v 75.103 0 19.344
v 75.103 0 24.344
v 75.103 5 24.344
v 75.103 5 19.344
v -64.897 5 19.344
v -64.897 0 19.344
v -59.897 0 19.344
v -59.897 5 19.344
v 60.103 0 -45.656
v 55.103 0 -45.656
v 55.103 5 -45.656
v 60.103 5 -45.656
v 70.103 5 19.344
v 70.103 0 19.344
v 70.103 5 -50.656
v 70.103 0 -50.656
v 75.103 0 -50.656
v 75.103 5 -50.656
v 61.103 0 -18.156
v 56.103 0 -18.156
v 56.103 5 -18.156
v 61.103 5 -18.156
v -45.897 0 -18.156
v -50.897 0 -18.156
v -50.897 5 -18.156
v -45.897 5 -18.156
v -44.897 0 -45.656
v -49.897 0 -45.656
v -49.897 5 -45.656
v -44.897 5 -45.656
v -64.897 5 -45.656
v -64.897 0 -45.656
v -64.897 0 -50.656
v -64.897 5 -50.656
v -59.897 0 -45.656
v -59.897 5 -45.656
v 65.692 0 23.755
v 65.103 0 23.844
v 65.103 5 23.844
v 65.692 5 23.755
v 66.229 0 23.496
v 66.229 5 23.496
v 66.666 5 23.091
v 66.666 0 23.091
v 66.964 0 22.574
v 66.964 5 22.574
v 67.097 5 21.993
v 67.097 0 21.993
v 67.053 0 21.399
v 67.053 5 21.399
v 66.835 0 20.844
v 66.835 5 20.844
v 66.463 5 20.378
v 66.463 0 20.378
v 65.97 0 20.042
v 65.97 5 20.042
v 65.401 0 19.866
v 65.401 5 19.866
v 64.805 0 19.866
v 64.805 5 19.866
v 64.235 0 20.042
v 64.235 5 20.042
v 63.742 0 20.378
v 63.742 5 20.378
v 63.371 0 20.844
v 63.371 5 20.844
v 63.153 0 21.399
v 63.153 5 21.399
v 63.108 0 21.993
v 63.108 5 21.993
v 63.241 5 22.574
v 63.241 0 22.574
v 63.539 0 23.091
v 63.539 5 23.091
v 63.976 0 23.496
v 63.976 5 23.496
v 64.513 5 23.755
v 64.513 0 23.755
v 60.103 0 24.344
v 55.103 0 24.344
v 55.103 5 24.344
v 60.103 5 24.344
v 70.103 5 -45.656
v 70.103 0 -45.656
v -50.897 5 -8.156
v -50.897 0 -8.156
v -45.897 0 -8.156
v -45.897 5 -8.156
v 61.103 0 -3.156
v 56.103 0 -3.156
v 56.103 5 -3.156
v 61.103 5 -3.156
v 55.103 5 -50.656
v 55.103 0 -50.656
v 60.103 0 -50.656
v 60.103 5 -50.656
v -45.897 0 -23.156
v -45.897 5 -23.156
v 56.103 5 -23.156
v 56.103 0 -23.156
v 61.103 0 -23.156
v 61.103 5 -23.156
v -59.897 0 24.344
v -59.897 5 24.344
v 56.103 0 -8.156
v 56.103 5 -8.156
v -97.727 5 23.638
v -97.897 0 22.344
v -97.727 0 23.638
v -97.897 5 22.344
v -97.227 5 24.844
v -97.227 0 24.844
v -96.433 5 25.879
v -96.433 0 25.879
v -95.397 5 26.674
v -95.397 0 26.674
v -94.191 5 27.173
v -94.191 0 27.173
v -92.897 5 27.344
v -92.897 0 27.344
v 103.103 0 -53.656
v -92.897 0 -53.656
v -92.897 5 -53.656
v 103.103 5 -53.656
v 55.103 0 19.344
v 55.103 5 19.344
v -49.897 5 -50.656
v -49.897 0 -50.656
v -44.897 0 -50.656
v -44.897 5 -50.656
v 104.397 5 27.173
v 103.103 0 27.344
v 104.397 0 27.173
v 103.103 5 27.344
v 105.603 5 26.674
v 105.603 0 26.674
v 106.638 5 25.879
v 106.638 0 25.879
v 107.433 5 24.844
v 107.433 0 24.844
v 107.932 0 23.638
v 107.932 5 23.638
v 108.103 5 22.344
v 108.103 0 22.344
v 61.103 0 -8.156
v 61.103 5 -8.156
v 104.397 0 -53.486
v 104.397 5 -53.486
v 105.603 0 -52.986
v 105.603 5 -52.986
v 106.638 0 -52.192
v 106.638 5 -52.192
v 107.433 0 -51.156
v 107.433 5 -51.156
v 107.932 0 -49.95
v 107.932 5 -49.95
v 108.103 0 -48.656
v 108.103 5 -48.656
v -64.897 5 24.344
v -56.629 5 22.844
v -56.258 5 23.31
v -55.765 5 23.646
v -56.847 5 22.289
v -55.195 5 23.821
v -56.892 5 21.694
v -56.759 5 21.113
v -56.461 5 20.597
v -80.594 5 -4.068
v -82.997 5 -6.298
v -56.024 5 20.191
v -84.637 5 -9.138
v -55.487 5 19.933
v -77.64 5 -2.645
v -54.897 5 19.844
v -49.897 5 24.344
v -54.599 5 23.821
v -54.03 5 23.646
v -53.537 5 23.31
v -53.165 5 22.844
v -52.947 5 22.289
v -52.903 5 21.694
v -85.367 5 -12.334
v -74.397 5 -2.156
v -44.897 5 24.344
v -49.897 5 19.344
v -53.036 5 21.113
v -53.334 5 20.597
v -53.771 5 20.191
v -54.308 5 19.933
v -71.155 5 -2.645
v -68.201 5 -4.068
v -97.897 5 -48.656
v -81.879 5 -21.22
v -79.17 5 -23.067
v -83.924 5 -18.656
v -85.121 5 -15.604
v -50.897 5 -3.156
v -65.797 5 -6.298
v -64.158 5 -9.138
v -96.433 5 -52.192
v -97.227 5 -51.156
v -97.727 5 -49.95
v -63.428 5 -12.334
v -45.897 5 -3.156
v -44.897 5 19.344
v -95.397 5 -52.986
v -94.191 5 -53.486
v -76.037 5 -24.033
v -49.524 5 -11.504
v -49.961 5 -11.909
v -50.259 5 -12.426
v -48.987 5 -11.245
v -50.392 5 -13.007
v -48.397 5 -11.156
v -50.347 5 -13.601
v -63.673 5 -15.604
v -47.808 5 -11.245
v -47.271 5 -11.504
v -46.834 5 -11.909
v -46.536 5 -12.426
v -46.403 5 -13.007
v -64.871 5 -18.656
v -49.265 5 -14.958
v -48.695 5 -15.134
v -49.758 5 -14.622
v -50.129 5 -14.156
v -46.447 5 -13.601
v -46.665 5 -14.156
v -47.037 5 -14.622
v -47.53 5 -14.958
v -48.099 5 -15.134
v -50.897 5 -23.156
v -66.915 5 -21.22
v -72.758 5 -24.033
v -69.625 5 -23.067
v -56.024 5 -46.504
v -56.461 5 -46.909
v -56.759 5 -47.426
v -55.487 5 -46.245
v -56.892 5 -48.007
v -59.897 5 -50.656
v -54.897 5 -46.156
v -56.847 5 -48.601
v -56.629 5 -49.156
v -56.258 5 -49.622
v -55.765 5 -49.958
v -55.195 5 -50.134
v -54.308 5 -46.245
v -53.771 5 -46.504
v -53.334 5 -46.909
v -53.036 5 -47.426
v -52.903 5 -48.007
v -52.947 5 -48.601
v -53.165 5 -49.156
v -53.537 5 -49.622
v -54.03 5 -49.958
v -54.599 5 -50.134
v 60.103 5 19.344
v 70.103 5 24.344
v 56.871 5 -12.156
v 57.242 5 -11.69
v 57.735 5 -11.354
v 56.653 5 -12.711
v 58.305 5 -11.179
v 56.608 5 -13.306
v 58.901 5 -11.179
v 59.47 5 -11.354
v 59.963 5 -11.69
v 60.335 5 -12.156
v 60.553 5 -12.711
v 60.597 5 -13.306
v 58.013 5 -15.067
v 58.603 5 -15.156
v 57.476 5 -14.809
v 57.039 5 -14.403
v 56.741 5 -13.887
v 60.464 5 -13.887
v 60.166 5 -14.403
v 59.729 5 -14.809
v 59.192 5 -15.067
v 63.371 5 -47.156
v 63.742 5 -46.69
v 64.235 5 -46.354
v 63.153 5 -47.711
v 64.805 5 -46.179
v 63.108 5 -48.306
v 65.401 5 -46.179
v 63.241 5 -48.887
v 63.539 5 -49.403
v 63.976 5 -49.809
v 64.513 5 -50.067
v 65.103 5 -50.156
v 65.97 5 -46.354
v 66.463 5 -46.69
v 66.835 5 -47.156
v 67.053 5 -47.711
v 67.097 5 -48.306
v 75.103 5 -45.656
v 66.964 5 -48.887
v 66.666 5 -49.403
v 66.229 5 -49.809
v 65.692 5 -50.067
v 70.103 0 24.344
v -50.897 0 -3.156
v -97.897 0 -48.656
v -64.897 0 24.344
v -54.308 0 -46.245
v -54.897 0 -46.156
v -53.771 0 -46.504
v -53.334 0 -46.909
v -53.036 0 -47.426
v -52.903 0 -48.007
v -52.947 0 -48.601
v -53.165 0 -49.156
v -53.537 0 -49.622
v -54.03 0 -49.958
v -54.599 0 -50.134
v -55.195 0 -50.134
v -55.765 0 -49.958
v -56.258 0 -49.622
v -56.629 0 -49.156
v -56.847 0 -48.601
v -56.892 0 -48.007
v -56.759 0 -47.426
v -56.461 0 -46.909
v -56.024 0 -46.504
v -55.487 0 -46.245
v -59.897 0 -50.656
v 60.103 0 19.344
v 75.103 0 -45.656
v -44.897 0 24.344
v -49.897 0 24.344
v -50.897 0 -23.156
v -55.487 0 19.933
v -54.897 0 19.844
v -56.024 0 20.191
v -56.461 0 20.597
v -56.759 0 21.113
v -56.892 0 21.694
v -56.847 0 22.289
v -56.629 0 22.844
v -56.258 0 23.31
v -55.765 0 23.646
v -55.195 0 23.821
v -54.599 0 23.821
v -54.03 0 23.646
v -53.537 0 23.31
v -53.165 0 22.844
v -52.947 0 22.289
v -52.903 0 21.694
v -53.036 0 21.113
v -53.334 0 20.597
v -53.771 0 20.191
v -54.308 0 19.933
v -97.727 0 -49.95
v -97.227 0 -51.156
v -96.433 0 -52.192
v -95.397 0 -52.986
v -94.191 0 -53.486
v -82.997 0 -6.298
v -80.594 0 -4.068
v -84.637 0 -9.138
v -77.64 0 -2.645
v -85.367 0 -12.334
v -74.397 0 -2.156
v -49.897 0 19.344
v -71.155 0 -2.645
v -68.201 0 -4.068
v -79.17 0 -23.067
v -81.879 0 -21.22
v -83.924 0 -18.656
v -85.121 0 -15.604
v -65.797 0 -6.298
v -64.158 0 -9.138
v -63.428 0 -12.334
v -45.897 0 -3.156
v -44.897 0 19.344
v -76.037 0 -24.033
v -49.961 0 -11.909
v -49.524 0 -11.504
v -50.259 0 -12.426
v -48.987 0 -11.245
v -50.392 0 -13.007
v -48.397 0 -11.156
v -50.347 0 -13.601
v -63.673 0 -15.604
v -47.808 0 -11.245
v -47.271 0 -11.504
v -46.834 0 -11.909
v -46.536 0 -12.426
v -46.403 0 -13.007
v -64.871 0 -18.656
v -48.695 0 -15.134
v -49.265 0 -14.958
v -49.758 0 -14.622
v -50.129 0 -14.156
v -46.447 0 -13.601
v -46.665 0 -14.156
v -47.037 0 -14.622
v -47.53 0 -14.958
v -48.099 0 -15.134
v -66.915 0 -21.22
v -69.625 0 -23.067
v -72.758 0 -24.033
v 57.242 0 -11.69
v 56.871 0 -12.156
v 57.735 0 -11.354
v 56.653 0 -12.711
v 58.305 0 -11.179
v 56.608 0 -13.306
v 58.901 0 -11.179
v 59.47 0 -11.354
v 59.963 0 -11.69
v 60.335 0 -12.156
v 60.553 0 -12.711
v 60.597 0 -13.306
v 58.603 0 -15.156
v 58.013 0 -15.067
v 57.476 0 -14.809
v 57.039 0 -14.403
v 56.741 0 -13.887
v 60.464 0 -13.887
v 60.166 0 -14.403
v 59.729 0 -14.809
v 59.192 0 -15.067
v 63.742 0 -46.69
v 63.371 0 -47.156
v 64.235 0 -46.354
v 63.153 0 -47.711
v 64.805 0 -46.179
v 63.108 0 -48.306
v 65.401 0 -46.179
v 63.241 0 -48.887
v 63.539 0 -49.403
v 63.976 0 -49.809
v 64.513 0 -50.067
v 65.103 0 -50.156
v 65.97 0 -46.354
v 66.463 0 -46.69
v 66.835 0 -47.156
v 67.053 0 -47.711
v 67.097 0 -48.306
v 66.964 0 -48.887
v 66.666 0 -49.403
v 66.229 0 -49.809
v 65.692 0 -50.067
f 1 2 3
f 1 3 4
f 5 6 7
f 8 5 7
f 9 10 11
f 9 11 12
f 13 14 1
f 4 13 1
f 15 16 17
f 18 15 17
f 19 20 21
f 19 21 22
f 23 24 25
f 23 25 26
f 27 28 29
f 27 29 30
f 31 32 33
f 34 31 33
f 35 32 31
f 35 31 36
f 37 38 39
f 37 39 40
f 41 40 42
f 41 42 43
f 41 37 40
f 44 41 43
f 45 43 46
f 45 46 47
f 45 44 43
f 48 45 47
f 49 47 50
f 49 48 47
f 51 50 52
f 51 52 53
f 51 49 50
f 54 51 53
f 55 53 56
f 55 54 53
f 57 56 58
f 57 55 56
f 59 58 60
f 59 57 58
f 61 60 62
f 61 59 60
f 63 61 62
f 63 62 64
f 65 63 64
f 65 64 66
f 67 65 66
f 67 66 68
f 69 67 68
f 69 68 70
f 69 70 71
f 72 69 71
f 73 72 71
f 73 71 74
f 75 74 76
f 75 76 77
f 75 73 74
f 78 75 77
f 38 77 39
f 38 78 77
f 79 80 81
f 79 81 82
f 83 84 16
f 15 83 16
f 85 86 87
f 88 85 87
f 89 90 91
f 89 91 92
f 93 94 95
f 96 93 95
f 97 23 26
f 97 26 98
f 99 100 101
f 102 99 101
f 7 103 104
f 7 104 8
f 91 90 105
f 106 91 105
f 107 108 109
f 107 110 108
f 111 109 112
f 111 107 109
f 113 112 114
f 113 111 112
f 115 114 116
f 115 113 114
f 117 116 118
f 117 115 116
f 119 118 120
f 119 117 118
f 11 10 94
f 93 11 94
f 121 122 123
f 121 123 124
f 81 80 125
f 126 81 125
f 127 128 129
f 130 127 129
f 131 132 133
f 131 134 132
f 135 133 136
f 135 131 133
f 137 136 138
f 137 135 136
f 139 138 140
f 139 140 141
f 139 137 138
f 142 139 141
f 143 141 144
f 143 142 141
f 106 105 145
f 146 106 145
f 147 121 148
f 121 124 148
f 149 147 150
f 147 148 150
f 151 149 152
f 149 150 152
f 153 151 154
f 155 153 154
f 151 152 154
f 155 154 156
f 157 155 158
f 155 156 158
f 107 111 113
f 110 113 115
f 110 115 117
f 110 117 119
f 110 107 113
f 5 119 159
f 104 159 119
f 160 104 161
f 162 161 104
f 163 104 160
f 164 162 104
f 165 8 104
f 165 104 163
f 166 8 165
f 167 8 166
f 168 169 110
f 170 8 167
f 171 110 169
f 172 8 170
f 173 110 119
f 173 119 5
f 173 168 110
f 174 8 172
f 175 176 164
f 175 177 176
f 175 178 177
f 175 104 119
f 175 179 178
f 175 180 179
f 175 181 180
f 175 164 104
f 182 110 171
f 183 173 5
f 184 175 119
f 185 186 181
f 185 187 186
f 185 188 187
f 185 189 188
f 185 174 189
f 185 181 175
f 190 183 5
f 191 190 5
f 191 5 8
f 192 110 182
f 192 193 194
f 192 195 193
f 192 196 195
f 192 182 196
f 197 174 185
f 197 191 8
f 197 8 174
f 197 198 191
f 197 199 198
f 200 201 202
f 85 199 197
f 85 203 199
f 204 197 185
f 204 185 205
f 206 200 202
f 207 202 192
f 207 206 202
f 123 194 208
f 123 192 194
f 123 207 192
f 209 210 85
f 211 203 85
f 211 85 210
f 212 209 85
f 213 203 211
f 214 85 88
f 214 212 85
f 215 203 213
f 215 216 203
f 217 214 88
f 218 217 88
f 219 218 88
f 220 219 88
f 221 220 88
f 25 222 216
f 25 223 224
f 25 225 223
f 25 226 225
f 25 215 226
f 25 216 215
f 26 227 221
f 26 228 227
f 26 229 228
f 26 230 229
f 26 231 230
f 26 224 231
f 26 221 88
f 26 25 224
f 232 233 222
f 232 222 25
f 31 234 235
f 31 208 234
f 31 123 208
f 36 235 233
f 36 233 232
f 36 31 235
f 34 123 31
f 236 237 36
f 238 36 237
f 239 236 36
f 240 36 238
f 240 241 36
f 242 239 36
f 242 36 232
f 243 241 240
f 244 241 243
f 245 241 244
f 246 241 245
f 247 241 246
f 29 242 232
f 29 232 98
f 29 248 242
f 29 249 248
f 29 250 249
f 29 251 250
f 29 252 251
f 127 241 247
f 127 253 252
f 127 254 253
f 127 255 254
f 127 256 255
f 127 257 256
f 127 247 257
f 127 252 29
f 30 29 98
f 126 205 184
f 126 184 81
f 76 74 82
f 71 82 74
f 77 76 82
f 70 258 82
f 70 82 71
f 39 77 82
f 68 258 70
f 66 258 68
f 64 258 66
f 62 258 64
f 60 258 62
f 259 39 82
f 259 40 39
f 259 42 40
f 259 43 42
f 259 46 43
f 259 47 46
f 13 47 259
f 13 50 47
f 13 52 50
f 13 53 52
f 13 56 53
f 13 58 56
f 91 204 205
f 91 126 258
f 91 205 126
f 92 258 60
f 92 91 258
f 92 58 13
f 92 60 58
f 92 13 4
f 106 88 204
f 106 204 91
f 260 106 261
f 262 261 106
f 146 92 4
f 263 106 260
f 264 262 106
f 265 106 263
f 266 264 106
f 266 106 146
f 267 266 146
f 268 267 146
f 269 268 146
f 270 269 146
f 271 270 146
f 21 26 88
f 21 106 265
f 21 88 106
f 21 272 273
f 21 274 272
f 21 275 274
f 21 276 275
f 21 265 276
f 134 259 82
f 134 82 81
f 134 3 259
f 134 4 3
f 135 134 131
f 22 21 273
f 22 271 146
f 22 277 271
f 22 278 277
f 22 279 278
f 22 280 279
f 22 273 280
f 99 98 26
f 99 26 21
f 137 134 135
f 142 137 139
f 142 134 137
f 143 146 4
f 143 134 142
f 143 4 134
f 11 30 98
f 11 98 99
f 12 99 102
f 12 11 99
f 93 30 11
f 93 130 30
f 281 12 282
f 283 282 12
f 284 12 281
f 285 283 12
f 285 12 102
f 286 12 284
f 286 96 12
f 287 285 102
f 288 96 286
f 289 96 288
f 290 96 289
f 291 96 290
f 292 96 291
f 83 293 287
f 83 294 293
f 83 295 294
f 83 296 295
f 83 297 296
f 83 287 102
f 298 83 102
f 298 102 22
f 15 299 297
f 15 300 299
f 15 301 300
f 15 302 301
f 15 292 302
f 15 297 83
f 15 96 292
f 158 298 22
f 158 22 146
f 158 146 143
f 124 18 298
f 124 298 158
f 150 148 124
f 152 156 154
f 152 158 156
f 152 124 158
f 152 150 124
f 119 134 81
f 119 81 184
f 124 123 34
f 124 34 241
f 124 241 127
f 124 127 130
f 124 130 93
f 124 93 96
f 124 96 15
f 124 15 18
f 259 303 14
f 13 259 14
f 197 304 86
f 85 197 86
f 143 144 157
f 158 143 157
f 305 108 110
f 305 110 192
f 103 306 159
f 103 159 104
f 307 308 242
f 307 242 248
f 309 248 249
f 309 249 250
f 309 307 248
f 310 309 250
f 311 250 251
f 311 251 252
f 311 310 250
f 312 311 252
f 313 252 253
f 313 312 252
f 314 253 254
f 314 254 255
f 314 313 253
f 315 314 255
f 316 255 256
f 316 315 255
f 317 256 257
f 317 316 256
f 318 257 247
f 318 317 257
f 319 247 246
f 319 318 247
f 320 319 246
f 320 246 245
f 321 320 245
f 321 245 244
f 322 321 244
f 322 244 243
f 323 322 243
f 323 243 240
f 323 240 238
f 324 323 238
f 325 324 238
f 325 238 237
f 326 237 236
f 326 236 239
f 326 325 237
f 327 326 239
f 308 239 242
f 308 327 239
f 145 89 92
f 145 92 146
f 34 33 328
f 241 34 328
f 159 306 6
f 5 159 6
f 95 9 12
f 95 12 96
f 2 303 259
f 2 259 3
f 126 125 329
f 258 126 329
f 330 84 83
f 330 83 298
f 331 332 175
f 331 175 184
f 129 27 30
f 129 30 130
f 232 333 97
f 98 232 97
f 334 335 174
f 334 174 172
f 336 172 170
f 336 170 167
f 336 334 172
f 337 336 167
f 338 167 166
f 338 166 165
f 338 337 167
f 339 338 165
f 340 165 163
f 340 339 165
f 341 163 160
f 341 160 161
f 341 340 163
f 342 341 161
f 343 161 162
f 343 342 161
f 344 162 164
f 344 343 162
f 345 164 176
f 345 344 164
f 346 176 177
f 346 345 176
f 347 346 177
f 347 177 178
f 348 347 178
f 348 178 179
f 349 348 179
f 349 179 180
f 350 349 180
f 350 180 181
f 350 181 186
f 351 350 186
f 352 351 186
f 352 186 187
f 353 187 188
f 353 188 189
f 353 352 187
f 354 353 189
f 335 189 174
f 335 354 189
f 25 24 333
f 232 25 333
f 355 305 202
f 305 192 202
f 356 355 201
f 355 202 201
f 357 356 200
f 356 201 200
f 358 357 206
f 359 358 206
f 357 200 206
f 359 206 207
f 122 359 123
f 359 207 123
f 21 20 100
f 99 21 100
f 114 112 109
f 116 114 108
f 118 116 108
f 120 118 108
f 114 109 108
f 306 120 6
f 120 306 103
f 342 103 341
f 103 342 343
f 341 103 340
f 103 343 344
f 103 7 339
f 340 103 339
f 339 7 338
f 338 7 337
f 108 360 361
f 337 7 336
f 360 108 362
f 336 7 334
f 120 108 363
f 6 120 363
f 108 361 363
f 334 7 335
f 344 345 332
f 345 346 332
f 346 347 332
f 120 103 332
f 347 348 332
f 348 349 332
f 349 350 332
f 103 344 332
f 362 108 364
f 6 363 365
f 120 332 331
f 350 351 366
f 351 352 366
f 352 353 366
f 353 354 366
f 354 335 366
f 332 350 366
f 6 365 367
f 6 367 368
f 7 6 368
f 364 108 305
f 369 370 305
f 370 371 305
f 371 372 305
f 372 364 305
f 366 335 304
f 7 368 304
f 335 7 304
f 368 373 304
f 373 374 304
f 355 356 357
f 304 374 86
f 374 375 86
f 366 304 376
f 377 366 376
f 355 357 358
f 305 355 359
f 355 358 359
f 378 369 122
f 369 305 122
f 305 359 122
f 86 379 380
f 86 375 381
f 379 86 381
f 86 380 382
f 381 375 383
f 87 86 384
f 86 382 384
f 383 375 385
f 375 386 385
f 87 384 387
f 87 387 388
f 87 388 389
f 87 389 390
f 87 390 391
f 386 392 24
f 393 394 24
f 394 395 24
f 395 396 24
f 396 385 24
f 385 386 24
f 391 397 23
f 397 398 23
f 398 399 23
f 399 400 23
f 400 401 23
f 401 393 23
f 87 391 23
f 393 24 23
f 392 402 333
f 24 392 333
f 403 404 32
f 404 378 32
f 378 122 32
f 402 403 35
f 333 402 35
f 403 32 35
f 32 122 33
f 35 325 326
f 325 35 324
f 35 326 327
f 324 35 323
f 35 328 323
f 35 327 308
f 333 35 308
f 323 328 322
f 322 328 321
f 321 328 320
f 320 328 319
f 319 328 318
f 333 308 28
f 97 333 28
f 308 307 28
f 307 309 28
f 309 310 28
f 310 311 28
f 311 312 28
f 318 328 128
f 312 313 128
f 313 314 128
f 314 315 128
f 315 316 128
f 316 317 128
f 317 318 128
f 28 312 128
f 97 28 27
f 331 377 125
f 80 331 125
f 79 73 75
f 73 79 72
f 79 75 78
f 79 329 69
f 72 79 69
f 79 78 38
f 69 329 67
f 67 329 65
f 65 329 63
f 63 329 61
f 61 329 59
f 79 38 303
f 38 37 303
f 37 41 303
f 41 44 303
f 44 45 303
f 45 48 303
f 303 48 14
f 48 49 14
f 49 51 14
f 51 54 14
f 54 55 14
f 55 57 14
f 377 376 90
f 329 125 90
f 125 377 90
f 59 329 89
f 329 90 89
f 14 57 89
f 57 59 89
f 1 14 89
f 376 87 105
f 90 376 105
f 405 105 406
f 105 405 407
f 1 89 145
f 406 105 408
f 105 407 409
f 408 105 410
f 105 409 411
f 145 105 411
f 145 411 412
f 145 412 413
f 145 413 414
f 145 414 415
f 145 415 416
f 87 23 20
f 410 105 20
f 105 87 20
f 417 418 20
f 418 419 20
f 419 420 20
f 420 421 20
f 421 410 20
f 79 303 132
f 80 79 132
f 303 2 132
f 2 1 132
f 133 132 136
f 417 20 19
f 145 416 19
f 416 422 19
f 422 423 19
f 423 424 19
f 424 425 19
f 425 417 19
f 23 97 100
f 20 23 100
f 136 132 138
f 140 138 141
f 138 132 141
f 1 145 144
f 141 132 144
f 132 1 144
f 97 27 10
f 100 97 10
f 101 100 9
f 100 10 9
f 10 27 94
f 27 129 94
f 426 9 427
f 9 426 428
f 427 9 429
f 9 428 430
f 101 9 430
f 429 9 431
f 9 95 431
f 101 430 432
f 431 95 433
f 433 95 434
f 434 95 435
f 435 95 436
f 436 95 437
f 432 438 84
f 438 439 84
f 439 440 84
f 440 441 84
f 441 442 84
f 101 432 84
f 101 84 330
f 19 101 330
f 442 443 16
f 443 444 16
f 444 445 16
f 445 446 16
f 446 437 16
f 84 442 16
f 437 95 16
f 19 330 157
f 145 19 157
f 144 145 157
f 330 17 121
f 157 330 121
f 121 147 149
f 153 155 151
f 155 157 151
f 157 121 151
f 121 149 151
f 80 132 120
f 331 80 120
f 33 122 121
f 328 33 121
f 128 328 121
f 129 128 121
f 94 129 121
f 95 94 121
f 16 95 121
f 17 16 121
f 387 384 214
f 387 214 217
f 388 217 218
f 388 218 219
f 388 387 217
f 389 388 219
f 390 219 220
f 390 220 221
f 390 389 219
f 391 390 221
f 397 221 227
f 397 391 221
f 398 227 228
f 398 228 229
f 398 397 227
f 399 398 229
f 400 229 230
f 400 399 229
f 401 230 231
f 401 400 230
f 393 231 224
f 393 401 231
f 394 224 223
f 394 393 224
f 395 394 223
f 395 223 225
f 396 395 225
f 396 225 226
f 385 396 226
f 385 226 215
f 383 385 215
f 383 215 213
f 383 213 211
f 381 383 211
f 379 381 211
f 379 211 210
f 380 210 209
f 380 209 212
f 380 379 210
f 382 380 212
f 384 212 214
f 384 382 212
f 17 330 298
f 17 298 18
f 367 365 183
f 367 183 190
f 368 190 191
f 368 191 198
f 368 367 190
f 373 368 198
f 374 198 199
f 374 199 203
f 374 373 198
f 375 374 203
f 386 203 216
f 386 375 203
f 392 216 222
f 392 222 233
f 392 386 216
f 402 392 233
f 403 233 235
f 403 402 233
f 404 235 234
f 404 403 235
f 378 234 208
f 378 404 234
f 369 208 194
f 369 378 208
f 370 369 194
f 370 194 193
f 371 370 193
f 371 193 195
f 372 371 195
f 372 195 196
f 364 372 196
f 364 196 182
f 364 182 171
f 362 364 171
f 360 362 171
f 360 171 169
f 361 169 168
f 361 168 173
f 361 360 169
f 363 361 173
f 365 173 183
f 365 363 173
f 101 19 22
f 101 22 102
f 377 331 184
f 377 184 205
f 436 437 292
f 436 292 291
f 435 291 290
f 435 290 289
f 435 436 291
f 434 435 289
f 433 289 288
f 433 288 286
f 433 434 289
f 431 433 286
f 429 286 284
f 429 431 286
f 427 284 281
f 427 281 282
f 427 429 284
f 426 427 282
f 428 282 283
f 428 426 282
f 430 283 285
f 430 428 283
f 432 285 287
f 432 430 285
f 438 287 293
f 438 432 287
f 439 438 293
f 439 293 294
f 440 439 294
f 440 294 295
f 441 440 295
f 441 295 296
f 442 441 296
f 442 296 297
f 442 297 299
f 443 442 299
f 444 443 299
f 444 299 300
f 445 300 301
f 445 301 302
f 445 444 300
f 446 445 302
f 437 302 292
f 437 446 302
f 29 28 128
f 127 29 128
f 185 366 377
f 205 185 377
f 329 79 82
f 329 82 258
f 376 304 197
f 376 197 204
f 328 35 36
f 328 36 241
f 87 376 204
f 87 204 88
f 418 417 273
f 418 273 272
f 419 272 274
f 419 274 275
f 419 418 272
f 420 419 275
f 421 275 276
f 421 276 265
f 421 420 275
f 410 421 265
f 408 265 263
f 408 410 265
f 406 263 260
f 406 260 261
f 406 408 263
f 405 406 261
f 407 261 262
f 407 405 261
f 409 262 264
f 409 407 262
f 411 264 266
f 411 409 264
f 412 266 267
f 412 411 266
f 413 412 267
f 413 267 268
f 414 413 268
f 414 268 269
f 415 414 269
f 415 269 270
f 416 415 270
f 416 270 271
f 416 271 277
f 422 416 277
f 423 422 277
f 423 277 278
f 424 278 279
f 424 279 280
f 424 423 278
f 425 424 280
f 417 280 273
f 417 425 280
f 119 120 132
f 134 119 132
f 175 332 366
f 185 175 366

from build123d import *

# Parameters (mm, degrees)
SKETCH1_W           = 206
SKETCH1_H           = 81
SKETCH1_R           = 2
SKETCH1_R_2         = 11
SKETCH1_W_2         = 5
SKETCH1_H_2         = 5
BOSS_EXTRUDE4_DEPTH = 5
FILLET9_R           = 5


with BuildPart() as part:
    # Sketch1 → Boss-Extrude4 (new body)
    with BuildSketch(Plane(origin=(0, 0, 0), x_dir=(1, 0, 0), z_dir=(0, 1, 0))):
        with Locations((5.102707087, 13.156325227)):
            Rectangle(SKETCH1_W, SKETCH1_H)
        with Locations(Location((-54.897292913, 48.156325227, 0), (0, 0, 270))):
            Circle(SKETCH1_R, mode=Mode.SUBTRACT)
        with Locations(Location((-54.897292913, -21.843674773, 0), (0, 0, 90))):
            Circle(SKETCH1_R, mode=Mode.SUBTRACT)
        with Locations(Location((65.102707087, -21.843674773, 0), (0, 0, 270))):
            Circle(SKETCH1_R, mode=Mode.SUBTRACT)
        with Locations(Location((65.102707087, 48.156325227, 0), (0, 0, 90))):
            Circle(SKETCH1_R, mode=Mode.SUBTRACT)
        with Locations(Location((-48.397292913, 13.156325227, 0), (0, 0, 270))):
            Circle(SKETCH1_R, mode=Mode.SUBTRACT)
        with Locations(Location((58.602707087, 13.156325227, 0), (0, 0, 90))):
            Circle(SKETCH1_R, mode=Mode.SUBTRACT)
        with Locations(Location((-74.397292913, 13.156325227, 0), (0, 0, 270))):
            Circle(SKETCH1_R_2, mode=Mode.SUBTRACT)
        with Locations((57.602707087, 48.156325227)):
            Rectangle(SKETCH1_W_2, SKETCH1_H_2, mode=Mode.SUBTRACT)
        with Locations((-62.397292913, 48.156325227)):
            Rectangle(SKETCH1_W_2, SKETCH1_H_2, mode=Mode.SUBTRACT)
        with Locations((-47.397292913, 48.156325227)):
            Rectangle(SKETCH1_W_2, SKETCH1_H_2, mode=Mode.SUBTRACT)
        with Locations((72.602707087, 48.156325227)):
            Rectangle(SKETCH1_W_2, SKETCH1_H_2, mode=Mode.SUBTRACT)
        with Locations((72.602707087, -21.843674773)):
            Rectangle(SKETCH1_W_2, SKETCH1_H_2, mode=Mode.SUBTRACT)
        with Locations((57.602707087, -21.843674773)):
            Rectangle(SKETCH1_W_2, SKETCH1_H_2, mode=Mode.SUBTRACT)
        with Locations((-47.397292913, -21.843674773)):
            Rectangle(SKETCH1_W_2, SKETCH1_H_2, mode=Mode.SUBTRACT)
        with Locations((-62.397292913, -21.843674773)):
            Rectangle(SKETCH1_W_2, SKETCH1_H_2, mode=Mode.SUBTRACT)
        with Locations((-48.397292913, 20.656325227)):
            Rectangle(SKETCH1_W_2, SKETCH1_H_2, mode=Mode.SUBTRACT)
        with Locations((-48.397292913, 5.656325227)):
            Rectangle(SKETCH1_W_2, SKETCH1_H_2, mode=Mode.SUBTRACT)
        with Locations((58.602707087, 5.656325227)):
            Rectangle(SKETCH1_W_2, SKETCH1_H_2, mode=Mode.SUBTRACT)
        with Locations((58.602707087, 20.656325227)):
            Rectangle(SKETCH1_W_2, SKETCH1_H_2, mode=Mode.SUBTRACT)
    extrude(amount=BOSS_EXTRUDE4_DEPTH)

    # Fillet9
    fillet9_edges = [part.edges().sort_by_distance(p)[0] for p in [
        (-97.897292913, 2.5, -53.656325227),
        (108.102707087, 2.5, -53.656325227),
        (108.102707087, 2.5, 27.343674773),
        (-97.897292913, 2.5, 27.343674773),
    ]]
    fillet(fillet9_edges, radius=FILLET9_R)


solid = part.part
